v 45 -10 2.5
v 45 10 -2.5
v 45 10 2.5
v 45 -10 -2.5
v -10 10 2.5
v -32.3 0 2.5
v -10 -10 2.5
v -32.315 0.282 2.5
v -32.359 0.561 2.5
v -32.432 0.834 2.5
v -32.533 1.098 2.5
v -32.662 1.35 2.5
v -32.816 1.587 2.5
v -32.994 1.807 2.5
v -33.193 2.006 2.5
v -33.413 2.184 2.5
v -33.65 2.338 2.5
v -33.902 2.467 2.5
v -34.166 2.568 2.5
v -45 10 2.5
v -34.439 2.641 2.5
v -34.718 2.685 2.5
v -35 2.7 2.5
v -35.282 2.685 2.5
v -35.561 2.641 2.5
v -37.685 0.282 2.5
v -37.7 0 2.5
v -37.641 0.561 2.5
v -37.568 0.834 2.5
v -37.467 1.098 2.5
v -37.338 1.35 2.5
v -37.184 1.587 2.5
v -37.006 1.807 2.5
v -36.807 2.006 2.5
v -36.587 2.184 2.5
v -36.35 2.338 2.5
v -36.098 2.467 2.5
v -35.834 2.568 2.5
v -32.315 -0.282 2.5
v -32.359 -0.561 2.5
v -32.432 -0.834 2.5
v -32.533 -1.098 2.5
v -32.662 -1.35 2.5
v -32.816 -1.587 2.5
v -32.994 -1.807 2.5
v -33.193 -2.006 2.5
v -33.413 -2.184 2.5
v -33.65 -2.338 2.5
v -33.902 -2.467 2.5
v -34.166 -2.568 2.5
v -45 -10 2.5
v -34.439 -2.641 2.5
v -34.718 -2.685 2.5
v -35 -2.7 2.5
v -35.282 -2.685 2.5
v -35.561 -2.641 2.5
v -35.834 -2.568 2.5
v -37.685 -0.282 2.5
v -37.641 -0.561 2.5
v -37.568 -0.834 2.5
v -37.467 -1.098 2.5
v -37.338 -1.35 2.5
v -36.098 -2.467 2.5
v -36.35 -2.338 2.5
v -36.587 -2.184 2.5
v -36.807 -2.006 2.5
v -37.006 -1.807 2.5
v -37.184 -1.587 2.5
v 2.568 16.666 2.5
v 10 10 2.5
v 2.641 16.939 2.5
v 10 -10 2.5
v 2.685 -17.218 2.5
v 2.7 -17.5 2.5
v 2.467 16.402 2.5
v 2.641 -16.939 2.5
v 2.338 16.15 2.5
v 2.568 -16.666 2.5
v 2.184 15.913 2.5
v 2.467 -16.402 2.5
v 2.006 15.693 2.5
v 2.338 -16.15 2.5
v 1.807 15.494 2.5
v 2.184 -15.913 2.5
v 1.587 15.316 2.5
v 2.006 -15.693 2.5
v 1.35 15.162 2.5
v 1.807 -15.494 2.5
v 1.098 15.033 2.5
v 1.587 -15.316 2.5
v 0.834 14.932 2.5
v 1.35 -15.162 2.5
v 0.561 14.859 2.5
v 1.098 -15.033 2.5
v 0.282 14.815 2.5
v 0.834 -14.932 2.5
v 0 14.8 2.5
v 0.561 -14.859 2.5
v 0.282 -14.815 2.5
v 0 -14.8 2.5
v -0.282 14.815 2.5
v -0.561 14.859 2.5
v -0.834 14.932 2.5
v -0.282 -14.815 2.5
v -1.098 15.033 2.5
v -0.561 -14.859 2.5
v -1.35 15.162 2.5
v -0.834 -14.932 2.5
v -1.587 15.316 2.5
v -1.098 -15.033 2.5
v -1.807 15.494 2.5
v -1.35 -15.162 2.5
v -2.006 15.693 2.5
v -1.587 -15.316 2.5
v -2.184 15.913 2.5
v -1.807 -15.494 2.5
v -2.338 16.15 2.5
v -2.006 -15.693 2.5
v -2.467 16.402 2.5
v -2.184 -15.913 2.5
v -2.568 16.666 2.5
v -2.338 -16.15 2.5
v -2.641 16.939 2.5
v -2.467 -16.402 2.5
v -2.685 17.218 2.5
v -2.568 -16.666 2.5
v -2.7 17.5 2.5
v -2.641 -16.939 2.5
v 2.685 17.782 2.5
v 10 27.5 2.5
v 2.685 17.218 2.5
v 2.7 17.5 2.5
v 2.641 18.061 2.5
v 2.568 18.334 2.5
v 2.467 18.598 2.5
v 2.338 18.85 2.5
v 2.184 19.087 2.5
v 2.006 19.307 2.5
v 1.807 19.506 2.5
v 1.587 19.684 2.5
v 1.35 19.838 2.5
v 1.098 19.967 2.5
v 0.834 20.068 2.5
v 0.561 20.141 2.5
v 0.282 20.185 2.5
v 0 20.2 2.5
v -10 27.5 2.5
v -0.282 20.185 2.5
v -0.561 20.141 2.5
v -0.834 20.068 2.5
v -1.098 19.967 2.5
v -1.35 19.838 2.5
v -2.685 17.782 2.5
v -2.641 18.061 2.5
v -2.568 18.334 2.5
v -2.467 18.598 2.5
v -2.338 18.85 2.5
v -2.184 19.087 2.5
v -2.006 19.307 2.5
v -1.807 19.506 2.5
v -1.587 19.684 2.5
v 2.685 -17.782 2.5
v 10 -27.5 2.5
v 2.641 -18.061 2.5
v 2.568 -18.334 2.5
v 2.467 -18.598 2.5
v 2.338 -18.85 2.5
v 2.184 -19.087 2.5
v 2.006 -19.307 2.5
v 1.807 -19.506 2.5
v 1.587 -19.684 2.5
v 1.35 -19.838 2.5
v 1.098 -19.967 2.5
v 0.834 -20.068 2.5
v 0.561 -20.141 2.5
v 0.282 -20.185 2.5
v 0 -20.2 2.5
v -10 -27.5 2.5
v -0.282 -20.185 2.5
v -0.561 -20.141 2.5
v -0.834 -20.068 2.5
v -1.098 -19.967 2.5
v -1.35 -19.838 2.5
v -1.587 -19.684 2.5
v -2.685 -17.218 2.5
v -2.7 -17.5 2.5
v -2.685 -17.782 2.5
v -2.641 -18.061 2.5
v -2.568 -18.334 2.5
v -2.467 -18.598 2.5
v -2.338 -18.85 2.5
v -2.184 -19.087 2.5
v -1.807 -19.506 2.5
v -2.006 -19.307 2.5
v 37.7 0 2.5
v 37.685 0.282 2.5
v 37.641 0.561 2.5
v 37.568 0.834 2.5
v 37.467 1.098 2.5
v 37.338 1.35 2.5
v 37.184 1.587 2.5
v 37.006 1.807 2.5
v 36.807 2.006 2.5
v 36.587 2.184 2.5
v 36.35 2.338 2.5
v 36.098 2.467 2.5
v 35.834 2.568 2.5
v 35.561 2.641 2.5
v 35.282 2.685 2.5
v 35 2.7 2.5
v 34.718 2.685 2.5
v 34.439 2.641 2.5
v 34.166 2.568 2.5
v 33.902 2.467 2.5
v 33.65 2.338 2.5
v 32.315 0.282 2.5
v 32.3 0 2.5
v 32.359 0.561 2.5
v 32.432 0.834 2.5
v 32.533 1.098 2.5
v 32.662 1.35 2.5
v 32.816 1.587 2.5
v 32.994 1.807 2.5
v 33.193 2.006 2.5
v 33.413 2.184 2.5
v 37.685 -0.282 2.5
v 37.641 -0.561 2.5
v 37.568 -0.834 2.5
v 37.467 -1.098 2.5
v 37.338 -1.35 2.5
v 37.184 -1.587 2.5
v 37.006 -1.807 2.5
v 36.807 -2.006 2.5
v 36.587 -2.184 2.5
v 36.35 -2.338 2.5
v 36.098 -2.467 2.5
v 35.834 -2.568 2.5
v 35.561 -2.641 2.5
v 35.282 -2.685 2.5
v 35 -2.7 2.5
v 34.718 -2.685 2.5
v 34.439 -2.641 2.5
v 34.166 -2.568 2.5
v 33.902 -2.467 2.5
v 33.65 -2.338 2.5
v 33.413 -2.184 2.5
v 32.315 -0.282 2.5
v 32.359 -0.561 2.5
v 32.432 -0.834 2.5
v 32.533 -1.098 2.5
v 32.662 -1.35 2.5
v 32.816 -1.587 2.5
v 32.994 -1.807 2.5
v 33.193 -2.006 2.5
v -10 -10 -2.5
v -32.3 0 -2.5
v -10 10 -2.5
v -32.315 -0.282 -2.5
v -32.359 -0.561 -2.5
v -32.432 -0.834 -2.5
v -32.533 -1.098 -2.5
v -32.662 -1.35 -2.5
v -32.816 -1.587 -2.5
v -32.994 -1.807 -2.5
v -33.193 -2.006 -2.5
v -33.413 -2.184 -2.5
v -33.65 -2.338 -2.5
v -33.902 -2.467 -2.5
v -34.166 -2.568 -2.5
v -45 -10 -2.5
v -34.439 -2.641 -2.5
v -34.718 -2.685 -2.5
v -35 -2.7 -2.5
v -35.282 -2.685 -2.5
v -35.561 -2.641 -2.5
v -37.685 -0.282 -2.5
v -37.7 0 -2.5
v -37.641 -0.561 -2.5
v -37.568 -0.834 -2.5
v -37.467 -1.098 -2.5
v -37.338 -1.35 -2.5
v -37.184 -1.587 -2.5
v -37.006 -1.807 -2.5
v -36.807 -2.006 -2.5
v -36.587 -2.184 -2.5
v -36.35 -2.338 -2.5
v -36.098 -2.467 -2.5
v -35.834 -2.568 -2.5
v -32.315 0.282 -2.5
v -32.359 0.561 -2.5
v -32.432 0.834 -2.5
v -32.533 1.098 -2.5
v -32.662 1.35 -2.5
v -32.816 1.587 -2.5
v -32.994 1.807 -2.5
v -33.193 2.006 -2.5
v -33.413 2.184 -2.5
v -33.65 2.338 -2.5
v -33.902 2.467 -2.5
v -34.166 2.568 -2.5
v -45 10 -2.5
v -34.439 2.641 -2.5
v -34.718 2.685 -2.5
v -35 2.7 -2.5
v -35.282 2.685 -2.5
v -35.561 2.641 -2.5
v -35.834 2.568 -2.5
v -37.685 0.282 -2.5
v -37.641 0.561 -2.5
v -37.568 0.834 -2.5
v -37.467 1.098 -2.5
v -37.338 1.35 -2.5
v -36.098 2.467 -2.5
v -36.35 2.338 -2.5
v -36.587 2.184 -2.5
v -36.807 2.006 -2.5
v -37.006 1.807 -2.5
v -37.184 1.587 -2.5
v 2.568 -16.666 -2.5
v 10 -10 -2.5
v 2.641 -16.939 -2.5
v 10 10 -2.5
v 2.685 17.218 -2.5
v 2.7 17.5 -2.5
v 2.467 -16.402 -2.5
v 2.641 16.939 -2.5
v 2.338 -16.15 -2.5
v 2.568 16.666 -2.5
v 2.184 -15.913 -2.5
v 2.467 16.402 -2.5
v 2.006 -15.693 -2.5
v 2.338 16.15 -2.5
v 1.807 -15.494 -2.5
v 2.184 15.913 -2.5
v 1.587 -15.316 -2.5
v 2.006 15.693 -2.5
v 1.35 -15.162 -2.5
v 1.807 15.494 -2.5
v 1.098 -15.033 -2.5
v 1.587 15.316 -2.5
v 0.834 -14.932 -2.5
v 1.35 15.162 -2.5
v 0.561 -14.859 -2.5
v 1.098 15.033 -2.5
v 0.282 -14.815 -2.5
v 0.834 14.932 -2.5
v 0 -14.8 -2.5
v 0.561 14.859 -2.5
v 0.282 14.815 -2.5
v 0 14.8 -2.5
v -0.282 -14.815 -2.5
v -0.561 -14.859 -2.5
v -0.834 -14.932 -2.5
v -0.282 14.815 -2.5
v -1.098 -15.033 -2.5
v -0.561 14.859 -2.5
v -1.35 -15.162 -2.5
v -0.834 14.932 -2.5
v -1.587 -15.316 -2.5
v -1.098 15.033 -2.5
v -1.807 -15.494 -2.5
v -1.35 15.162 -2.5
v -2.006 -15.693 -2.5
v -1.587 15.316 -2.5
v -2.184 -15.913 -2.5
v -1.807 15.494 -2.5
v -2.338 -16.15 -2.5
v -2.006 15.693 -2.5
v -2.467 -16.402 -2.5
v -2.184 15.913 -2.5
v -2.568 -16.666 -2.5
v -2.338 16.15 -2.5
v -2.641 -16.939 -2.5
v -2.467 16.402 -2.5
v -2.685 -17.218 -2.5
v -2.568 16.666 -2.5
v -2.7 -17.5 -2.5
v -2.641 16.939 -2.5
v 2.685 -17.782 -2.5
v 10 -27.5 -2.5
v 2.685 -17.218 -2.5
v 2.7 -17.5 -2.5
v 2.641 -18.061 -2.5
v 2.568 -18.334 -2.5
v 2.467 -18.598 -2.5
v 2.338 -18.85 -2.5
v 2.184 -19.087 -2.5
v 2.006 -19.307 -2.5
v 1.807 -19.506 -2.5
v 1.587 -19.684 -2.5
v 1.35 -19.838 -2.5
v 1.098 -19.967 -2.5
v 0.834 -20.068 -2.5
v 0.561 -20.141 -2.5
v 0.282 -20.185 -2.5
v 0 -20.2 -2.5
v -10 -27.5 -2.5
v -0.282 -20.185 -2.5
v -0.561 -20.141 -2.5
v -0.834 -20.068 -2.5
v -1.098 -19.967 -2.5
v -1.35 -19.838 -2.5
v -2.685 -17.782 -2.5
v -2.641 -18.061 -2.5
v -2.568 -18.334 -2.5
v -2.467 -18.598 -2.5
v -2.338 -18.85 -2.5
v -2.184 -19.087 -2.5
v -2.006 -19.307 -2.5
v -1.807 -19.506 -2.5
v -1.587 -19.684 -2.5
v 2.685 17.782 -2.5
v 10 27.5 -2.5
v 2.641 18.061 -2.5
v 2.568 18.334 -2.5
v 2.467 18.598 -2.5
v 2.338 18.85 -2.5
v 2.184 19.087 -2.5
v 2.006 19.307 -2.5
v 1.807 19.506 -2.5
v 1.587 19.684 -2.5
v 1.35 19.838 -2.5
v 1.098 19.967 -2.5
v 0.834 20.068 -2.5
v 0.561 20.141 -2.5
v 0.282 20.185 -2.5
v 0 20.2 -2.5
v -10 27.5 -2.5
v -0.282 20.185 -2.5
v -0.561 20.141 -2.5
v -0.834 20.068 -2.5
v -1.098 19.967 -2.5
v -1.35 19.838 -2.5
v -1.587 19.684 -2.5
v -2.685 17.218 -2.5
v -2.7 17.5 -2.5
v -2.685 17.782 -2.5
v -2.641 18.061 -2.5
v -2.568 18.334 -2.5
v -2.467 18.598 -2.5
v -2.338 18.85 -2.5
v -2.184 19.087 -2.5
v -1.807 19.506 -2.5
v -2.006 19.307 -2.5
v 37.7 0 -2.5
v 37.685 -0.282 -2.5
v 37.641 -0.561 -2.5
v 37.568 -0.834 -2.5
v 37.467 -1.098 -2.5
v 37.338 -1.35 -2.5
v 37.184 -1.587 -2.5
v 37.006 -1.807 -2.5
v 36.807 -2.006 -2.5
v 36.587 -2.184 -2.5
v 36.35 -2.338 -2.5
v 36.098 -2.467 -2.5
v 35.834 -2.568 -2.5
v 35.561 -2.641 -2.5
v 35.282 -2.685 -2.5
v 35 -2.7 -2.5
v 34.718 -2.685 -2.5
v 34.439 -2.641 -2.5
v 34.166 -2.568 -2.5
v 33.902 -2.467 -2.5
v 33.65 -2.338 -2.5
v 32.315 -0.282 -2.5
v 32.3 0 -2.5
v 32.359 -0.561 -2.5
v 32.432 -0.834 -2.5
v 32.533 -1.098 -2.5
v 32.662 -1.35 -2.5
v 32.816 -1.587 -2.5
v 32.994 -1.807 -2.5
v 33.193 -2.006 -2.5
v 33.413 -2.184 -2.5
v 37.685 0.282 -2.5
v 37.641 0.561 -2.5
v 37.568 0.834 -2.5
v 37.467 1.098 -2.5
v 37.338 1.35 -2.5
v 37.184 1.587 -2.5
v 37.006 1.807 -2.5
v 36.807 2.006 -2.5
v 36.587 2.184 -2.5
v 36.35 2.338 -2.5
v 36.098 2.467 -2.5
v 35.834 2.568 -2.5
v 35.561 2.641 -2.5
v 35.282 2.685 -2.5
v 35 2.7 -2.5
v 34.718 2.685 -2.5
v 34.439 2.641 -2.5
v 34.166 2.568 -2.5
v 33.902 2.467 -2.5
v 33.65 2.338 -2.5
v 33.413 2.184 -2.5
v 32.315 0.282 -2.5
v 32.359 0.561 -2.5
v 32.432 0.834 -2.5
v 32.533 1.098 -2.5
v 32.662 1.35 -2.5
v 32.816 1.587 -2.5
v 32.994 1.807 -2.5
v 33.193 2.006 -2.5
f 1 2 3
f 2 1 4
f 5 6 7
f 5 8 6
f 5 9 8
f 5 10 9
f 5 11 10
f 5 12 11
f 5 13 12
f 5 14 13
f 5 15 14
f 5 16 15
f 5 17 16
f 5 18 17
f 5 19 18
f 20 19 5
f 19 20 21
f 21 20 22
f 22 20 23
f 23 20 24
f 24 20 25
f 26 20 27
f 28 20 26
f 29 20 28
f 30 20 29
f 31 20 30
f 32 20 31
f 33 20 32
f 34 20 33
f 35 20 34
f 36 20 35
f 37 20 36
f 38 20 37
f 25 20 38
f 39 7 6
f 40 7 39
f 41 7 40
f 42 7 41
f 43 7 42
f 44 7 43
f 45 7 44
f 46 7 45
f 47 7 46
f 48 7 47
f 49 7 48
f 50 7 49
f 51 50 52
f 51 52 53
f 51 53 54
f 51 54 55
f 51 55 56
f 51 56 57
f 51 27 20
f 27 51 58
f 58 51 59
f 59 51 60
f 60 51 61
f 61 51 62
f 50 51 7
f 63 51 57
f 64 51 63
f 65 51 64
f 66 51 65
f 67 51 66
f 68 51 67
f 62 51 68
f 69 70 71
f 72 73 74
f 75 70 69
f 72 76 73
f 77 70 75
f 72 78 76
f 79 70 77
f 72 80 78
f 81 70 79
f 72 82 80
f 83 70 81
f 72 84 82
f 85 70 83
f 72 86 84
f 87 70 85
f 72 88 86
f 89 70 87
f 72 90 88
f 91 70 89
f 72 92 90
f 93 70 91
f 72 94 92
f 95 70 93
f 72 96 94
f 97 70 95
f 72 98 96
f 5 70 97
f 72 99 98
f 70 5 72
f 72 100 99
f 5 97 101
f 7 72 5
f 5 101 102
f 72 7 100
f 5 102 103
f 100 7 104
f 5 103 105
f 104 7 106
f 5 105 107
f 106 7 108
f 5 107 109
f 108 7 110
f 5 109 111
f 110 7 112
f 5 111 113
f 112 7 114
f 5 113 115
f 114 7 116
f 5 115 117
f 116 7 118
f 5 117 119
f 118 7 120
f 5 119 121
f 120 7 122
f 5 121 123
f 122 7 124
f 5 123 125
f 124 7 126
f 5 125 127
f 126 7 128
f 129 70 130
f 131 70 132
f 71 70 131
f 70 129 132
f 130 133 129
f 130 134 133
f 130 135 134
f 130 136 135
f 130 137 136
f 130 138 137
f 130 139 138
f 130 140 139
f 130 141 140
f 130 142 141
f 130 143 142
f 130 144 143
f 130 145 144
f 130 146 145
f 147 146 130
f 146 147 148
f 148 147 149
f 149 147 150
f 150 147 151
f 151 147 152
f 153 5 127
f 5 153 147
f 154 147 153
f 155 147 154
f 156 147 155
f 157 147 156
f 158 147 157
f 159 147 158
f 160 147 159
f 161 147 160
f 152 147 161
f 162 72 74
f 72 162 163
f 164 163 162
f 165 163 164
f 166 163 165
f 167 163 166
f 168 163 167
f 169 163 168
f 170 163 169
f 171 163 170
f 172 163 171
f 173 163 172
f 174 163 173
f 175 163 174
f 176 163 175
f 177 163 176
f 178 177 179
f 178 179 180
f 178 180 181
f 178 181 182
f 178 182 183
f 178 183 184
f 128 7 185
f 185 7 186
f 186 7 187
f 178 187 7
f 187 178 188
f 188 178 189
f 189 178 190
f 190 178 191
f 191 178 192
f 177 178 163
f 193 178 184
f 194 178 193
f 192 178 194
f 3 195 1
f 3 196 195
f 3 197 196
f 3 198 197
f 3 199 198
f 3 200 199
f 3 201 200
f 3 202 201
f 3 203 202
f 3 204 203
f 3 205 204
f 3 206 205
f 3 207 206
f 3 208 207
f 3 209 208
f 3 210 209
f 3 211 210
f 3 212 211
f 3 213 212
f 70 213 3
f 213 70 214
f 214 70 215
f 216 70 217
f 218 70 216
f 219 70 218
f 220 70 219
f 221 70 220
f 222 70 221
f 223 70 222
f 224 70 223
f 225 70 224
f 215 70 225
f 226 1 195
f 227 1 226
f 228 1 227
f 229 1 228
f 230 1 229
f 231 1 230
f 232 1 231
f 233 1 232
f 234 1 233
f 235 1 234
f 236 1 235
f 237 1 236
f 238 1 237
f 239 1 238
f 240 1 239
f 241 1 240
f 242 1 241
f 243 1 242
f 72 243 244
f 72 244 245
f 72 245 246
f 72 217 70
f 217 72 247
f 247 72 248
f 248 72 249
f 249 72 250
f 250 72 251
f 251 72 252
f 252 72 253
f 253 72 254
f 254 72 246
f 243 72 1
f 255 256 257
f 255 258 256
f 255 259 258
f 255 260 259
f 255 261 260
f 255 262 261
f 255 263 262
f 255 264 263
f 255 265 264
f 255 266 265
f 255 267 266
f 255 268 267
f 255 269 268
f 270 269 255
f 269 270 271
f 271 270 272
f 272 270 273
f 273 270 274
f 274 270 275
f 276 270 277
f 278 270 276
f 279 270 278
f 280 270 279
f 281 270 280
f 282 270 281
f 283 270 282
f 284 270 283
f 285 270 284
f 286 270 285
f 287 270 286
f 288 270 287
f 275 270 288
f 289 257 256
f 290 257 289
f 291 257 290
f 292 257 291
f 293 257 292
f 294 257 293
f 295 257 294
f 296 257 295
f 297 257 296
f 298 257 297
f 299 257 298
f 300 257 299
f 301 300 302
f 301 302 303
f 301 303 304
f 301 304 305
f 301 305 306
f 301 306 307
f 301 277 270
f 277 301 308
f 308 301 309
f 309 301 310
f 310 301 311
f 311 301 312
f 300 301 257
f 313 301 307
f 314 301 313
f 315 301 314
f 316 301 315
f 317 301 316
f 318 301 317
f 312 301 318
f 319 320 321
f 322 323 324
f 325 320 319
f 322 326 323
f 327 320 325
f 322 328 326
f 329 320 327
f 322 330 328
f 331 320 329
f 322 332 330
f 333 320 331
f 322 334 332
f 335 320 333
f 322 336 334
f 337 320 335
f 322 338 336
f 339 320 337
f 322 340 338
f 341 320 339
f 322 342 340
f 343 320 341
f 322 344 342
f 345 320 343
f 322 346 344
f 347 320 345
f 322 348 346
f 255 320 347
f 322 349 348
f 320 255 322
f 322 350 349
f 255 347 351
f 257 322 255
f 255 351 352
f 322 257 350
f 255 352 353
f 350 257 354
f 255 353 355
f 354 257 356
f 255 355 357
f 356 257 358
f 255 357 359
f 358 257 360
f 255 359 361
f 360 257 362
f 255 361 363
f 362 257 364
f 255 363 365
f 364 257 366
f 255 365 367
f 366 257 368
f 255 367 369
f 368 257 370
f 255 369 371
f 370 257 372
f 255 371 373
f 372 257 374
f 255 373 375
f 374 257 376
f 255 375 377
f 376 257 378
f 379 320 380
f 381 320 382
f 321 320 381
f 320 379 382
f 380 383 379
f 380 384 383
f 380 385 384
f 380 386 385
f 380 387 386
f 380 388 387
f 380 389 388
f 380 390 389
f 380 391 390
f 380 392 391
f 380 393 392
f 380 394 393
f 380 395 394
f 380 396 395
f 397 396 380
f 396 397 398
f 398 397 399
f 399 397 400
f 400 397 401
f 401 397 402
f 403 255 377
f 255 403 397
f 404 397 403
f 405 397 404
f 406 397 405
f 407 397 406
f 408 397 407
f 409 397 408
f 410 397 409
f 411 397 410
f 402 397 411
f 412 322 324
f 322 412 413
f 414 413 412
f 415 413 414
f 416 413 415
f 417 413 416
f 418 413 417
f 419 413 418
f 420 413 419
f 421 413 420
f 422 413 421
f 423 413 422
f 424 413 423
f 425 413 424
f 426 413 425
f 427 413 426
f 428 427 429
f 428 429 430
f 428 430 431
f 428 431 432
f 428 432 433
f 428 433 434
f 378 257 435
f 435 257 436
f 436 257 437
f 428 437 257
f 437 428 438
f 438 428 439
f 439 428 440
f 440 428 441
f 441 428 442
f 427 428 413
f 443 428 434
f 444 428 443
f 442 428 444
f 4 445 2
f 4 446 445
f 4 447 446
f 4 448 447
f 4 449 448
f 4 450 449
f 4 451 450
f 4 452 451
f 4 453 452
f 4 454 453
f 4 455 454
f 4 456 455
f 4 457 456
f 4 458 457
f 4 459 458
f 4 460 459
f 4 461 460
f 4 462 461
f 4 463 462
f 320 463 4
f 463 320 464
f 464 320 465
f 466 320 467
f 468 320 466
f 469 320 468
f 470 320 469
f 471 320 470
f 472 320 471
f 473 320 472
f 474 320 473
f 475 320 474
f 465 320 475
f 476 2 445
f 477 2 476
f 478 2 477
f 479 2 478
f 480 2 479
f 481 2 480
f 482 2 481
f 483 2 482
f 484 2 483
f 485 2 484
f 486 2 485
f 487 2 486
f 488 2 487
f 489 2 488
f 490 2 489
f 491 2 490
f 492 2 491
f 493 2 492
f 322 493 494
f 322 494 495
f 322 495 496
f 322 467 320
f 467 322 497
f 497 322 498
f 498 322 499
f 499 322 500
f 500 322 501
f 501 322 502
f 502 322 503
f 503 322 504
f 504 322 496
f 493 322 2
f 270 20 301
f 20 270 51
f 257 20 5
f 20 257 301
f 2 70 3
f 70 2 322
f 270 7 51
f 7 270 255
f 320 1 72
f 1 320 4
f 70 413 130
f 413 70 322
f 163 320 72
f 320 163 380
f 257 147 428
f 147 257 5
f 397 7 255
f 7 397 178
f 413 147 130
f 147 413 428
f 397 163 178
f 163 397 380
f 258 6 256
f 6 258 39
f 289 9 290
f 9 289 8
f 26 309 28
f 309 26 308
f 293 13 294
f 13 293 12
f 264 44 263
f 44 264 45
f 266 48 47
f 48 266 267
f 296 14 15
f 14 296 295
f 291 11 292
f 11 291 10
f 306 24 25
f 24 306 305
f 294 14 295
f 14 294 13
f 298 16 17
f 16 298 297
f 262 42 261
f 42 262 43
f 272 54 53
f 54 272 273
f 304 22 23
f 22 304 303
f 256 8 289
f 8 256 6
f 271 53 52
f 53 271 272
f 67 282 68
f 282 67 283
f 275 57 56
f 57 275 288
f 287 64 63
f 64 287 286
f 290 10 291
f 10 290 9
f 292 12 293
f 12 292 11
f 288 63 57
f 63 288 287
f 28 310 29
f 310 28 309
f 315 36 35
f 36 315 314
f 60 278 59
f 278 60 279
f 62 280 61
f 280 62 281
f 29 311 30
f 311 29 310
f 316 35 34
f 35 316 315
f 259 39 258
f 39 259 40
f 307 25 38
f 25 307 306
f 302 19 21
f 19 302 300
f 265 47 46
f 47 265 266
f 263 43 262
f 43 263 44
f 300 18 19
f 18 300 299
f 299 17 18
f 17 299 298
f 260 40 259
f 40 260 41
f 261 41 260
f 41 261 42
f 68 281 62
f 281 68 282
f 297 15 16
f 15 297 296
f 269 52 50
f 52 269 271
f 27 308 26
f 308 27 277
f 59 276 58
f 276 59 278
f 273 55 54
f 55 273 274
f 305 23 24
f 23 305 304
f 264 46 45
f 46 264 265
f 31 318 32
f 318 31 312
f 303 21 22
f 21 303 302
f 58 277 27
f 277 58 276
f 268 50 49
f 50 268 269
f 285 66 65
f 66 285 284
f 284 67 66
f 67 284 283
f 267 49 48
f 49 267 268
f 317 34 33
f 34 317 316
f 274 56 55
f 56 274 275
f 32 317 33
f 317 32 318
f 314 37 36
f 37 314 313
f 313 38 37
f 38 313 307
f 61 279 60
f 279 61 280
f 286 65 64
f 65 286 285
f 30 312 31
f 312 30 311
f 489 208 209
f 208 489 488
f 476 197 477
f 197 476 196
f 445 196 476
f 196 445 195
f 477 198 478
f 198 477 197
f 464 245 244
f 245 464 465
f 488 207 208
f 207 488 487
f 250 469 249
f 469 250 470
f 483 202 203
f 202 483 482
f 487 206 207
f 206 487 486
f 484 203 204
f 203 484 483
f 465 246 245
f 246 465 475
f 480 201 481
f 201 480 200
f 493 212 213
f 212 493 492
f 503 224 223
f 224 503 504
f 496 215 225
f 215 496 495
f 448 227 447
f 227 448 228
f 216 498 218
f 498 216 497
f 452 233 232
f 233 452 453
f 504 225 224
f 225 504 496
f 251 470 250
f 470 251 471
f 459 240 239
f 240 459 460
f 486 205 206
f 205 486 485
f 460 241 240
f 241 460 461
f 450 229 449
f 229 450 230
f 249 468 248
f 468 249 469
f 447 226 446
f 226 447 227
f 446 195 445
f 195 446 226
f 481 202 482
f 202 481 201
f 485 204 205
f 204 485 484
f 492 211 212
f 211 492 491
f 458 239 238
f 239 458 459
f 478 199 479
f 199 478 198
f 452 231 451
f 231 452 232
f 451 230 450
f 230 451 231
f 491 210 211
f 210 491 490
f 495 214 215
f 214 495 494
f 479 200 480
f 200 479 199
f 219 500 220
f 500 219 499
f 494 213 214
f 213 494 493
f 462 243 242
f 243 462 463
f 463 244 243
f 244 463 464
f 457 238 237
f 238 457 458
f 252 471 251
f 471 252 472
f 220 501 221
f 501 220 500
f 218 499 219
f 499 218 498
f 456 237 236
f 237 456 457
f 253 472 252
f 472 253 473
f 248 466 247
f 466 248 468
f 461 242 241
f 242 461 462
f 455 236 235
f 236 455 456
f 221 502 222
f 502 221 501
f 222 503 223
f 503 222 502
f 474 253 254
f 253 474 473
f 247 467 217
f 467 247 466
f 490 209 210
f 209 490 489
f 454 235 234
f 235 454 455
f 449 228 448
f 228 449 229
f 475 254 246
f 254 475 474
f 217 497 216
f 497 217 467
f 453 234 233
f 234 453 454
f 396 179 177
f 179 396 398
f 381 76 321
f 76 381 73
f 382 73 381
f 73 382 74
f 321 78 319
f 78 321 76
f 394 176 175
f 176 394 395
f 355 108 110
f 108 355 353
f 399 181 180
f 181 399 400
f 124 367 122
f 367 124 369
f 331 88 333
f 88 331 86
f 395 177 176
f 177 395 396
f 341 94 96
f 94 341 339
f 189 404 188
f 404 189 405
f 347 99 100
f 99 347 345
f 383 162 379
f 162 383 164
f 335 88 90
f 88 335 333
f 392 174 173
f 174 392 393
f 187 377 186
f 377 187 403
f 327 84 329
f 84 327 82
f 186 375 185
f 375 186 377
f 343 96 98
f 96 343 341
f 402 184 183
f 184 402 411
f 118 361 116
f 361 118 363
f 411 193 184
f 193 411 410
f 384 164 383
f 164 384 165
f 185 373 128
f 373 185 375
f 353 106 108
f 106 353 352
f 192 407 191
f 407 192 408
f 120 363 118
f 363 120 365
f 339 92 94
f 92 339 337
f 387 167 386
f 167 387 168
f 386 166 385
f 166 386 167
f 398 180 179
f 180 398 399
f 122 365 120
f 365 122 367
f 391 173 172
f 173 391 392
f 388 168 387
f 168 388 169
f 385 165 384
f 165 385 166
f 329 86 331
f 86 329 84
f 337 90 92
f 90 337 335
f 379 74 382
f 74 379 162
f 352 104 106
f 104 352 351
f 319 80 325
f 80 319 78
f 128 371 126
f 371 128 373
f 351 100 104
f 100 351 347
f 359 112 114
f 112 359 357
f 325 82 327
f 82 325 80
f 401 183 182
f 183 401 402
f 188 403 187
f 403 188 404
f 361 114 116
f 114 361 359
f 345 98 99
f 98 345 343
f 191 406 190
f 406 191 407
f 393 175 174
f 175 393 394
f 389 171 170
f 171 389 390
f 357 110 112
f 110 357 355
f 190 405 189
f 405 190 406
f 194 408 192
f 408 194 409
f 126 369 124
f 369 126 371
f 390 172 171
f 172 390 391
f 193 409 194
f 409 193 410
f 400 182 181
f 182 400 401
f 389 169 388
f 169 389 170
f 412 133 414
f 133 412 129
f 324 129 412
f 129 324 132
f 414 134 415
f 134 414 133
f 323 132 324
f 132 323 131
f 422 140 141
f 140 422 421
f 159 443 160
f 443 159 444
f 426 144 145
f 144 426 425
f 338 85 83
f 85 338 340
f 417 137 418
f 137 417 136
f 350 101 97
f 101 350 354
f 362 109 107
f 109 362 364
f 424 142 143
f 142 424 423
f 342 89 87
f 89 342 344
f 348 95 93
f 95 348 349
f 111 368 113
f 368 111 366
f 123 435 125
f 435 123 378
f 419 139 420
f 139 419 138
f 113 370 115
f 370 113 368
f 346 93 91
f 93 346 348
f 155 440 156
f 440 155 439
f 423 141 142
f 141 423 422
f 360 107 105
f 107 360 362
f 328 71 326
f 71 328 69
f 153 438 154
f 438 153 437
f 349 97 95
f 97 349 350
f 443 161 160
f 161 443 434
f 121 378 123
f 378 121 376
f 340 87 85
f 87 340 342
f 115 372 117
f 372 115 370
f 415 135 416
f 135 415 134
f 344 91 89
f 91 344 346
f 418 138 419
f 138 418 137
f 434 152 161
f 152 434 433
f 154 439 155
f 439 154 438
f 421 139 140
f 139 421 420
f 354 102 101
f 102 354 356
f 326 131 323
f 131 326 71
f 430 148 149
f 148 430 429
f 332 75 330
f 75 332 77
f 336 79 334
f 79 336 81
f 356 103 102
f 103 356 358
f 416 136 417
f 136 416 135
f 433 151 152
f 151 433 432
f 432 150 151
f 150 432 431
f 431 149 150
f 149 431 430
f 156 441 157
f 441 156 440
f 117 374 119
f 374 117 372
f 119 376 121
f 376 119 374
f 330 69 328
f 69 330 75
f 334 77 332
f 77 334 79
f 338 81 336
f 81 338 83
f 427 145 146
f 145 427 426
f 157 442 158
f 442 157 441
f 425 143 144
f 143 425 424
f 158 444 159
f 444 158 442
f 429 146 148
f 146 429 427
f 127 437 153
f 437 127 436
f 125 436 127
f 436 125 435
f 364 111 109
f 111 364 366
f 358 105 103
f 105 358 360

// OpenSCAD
// T-shaped mounting plate.
$fn = 60;
eps = 0.02;
stem_l = 90;
arm_l = 55;
width = 20;
thickness = 5;
difference() {
    union() { cube([stem_l,width,thickness],center=true); cube([width,arm_l,thickness],center=true); }
    for (p=[[-stem_l/2+10,0],[stem_l/2-10,0],[0,-arm_l/2+10],[0,arm_l/2-10]]) translate([p[0],p[1],-thickness/2-eps]) cylinder(d=5.4,h=thickness+2*eps);
}
